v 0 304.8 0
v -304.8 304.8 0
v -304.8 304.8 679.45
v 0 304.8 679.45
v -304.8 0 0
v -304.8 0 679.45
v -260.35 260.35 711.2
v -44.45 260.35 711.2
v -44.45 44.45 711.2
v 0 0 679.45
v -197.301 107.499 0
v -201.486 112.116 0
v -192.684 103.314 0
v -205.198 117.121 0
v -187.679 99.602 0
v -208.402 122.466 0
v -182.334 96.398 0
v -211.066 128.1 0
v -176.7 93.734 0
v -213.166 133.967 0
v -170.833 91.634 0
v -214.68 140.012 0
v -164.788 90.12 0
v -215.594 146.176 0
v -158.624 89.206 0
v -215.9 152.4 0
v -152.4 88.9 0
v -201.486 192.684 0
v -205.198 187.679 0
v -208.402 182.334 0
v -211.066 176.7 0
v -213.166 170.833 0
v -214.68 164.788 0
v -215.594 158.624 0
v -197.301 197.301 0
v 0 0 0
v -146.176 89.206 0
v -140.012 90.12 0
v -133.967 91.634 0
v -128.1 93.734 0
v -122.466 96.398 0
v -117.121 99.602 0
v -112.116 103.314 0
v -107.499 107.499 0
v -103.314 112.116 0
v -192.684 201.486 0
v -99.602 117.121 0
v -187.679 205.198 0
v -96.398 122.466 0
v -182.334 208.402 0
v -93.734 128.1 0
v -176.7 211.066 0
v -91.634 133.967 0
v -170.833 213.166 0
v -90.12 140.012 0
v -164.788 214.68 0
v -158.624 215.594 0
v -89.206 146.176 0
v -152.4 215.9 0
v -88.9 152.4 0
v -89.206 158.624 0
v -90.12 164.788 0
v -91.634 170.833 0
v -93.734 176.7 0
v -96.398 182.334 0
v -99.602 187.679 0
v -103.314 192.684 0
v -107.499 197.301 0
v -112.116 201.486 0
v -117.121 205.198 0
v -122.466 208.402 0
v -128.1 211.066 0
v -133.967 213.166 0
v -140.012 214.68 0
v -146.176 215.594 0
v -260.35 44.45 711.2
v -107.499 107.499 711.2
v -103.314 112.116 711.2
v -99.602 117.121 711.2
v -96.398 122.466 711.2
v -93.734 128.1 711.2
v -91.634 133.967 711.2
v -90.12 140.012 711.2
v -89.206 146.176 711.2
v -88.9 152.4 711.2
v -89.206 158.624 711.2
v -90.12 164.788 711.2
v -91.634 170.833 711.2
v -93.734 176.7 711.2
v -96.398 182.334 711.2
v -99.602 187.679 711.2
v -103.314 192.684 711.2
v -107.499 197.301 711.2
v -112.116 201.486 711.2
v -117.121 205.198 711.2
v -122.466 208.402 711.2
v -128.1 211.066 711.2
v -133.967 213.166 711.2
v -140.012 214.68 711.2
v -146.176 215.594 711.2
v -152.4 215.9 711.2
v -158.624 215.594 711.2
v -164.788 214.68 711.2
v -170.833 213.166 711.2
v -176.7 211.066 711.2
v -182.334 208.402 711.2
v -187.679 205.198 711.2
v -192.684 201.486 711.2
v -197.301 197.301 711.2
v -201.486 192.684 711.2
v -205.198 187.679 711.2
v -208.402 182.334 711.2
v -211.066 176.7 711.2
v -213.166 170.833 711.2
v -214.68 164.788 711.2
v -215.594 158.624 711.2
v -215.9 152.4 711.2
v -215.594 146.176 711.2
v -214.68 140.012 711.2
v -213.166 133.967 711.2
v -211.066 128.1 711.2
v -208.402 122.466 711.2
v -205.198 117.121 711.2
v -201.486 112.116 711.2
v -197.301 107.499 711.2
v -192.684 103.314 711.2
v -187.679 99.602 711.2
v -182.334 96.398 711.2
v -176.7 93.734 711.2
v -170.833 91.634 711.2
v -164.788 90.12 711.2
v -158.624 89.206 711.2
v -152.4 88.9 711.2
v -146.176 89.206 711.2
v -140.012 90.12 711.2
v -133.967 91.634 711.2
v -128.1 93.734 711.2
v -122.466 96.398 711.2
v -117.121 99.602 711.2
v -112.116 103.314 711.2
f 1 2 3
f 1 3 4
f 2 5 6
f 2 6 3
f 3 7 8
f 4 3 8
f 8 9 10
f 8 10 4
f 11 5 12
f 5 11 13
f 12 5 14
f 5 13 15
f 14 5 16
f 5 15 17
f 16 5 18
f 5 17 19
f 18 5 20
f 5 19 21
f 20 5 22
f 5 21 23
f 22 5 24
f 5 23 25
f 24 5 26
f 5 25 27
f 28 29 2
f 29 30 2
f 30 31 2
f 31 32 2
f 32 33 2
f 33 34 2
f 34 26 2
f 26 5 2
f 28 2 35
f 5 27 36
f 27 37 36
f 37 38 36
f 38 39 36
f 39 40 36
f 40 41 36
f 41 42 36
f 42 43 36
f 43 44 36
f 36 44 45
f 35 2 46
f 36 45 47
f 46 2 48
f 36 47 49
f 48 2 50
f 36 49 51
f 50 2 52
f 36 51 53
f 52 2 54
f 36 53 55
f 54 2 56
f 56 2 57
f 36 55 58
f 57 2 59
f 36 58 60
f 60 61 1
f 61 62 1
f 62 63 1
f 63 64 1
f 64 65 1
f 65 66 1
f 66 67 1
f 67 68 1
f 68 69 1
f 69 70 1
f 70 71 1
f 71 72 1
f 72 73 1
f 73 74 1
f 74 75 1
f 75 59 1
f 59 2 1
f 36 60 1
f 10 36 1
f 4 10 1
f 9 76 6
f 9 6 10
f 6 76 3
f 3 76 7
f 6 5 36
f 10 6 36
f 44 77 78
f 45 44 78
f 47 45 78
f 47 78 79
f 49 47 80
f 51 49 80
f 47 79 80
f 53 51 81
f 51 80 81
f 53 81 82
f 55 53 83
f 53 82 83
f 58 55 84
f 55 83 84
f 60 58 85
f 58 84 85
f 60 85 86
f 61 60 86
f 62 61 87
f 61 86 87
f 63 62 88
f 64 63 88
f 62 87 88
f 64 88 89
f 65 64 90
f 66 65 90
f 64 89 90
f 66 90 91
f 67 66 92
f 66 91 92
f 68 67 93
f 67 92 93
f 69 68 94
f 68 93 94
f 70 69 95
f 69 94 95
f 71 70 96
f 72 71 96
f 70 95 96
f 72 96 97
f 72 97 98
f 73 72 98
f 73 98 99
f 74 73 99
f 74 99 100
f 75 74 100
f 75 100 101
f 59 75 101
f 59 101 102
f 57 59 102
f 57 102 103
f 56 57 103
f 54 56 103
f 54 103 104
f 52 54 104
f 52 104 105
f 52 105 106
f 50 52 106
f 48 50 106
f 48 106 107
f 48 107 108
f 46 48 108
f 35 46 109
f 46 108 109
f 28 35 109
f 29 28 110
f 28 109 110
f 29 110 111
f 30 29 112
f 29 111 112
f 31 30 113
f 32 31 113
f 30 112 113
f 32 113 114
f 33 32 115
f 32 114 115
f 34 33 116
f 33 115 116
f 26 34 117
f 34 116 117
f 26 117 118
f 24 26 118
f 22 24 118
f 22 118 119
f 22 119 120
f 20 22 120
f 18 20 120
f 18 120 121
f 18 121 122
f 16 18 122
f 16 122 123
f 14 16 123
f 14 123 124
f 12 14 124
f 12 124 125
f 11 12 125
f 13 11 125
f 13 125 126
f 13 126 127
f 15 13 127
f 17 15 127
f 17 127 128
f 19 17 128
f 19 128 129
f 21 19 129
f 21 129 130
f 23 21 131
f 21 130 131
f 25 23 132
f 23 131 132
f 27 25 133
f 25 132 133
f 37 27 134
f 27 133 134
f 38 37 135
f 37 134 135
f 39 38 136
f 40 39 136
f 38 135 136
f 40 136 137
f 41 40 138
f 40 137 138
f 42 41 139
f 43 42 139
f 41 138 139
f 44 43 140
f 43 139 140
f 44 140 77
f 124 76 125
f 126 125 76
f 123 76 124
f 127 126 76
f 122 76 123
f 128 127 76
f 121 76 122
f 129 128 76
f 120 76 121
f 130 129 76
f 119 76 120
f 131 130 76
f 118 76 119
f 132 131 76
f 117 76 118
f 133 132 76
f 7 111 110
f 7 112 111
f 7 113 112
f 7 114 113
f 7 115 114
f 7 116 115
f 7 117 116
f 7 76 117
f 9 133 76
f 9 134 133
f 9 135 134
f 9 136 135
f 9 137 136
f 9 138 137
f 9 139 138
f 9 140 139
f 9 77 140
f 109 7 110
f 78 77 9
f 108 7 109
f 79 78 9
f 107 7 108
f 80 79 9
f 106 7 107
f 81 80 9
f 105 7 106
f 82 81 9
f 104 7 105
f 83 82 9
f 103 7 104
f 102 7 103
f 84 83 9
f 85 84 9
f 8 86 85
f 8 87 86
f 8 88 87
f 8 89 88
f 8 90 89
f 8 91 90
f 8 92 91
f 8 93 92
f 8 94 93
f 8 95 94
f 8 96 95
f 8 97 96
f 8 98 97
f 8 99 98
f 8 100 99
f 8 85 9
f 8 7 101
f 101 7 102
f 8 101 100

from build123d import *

# Parameters (mm, degrees)
F0_W     = 304.8
F0_H     = 304.8
F1_DEPTH = 711.2
F2_SIZE2 = 44.45
F2_SIZE  = 31.75
F4_DEPTH = 711.201


with BuildPart() as f1:
    # F0 (on Top) → F1 (new body)
    with BuildSketch(Plane.XY):
        with Locations((-152.4, 152.4)):
            Rectangle(F0_W, F0_H)
    extrude(amount=F1_DEPTH)

    # F2
    f2_edges = [f1.edges().sort_by_distance(p)[0] for p in [
        (-152.4, 0, 711.2),
        (0, 152.4, 711.2),
        (-152.4, 304.8, 711.2),
        (-304.8, 152.4, 711.2),
    ]]
    chamfer(f2_edges, length=F2_SIZE, length2=F2_SIZE2)

    # F3 (on face) → F4 (cut, through all)
    with BuildSketch(Plane.XY.offset(711.2)):
        with BuildLine():
            ThreePointArc((-88.9, 152.4), (-128.099602, 211.06635), (-197.301281, 197.301281))
            Line((-197.301281, 197.301281), (-107.498719, 107.498719))
            ThreePointArc((-107.498719, 107.498719), (-93.73365, 128.099602), (-88.9, 152.4))
        make_face()
        with BuildLine():
            Line((-107.498719, 107.498719), (-197.301281, 197.301281))
            ThreePointArc((-197.301281, 197.301281), (-197.301281, 107.498719), (-107.498719, 107.498719))
        make_face()
    extrude(amount=-F4_DEPTH, mode=Mode.SUBTRACT)


solid = f1.part
